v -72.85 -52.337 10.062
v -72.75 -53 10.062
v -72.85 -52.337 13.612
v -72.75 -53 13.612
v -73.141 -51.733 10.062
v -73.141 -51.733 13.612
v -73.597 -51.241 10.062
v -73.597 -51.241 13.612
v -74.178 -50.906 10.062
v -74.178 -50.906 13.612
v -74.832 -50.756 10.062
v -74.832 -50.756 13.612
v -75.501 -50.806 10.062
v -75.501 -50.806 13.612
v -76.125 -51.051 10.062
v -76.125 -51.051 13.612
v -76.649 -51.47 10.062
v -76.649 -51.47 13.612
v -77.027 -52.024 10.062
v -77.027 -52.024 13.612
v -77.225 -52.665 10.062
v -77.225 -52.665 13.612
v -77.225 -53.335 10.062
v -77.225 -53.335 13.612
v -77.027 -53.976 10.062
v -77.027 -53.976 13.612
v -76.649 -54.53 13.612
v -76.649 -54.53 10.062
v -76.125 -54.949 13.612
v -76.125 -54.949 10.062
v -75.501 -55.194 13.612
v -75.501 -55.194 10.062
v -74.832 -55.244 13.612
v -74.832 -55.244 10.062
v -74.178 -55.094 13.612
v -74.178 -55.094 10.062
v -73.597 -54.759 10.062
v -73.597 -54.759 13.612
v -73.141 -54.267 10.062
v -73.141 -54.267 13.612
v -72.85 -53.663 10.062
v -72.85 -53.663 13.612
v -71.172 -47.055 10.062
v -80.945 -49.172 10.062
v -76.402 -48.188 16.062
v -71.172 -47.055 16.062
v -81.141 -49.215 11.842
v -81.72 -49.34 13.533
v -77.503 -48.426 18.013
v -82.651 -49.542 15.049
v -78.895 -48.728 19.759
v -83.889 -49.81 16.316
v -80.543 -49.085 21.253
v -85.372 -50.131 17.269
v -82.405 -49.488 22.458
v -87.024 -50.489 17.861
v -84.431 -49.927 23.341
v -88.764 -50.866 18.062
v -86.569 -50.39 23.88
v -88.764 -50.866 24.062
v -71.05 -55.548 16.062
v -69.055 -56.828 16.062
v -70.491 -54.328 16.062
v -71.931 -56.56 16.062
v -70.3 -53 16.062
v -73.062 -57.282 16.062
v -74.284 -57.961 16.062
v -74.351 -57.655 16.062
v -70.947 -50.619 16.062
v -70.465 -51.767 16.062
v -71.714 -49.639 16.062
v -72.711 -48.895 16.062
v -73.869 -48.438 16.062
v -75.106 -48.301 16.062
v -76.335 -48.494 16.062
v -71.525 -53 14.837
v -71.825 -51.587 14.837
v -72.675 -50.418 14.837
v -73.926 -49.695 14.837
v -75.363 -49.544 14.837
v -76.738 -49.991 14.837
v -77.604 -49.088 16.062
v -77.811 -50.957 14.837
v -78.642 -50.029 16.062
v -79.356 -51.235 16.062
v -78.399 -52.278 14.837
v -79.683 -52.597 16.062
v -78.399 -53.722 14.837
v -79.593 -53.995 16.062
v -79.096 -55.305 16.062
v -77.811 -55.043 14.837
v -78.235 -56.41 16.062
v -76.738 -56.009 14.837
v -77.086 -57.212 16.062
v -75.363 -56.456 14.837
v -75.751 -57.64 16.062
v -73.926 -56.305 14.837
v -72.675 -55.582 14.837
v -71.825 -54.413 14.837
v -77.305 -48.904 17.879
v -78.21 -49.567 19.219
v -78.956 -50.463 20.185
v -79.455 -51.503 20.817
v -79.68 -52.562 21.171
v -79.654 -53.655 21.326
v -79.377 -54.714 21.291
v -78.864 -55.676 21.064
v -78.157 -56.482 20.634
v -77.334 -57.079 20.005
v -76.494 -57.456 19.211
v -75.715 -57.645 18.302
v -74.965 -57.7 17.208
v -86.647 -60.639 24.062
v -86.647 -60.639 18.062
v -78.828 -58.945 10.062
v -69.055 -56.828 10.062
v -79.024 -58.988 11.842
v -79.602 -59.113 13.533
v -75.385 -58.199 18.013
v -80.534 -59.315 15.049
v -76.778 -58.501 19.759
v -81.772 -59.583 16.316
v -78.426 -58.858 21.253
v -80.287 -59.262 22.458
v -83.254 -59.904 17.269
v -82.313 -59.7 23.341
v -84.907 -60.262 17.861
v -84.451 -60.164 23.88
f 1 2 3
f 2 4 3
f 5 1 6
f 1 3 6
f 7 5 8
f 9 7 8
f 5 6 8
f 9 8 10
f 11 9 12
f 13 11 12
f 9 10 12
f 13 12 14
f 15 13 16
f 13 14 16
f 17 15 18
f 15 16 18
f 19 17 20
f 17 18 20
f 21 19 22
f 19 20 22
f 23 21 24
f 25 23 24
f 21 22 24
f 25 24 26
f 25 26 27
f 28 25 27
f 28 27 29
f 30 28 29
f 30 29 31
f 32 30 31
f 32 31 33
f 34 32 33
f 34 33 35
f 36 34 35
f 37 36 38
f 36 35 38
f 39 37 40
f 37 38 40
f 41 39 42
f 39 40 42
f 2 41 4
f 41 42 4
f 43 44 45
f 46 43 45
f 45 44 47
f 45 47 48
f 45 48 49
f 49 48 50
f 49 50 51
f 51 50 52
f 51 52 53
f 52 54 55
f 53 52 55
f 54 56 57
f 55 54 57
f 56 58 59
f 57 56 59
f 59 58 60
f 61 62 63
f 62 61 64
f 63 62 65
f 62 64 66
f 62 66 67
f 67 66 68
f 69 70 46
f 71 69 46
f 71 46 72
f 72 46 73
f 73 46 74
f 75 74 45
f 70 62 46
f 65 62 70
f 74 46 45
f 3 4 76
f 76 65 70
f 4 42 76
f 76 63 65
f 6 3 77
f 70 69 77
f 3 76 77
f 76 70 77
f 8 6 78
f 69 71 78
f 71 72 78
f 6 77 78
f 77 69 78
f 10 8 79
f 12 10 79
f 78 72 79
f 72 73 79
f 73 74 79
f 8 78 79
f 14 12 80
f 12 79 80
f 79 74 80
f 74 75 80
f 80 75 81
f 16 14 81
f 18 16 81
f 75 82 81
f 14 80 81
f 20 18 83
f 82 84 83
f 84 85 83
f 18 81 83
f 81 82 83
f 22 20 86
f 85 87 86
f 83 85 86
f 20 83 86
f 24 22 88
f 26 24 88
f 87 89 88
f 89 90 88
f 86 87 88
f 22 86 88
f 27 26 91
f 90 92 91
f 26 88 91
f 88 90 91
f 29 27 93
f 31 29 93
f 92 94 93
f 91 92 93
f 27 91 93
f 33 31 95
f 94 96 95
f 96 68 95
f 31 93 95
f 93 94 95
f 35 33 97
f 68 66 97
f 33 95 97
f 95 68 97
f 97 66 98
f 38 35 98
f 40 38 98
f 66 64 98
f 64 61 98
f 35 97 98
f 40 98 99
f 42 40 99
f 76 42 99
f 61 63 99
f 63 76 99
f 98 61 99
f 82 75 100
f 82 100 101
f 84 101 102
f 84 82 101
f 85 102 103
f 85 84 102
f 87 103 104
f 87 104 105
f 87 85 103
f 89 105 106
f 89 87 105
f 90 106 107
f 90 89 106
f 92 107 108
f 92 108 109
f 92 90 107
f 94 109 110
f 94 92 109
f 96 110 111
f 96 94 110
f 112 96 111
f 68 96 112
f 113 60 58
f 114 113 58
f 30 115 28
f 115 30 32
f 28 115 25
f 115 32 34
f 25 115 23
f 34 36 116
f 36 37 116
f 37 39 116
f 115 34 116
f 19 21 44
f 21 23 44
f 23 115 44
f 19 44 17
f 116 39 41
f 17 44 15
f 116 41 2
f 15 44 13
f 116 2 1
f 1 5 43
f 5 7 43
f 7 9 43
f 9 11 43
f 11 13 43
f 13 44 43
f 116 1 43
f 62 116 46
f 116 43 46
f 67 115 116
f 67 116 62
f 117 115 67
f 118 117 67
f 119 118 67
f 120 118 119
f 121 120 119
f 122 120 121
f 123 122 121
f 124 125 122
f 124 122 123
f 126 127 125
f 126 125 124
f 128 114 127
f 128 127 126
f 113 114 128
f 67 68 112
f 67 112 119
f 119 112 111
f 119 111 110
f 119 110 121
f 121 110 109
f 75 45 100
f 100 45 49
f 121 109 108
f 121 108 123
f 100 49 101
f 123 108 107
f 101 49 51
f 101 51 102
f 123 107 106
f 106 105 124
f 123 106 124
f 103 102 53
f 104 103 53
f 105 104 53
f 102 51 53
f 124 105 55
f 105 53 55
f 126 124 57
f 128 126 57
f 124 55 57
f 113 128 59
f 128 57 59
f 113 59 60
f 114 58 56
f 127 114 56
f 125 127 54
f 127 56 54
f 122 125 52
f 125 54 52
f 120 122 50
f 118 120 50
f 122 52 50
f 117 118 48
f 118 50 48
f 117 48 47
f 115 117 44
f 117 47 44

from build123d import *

# Parameters (mm, degrees)
EXTRUDE_1_DEPTH     = 5
CUT_EXTRUDE_1_REACH = 109.797
SKETCH_2_R          = 4.7


# Read off the part's stored shape, not the designer's step: 高级异型孔1
with BuildPart() as part:
    # 草图1 → 凸台-拉伸1 (new, symmetric)
    with BuildSketch(Plane(origin=(-126.798228997, -64.222453956, -29.938468974), x_dir=(0, 0, -1), z_dir=(-0.21174441426742976, 0.9773250754107066, 0))):
        with BuildLine():
            Line((-40, -48), (-40, -58))
            Line((-40, -58), (-46, -58))
            Line((-46, -58), (-46, -52.649110641))
            ThreePointArc((-46, -52.649110641), (-51.832159566, -47.483314774), (-54, -40))
            Line((-54, -40), (-48, -40))
            ThreePointArc((-48, -40), (-45.656854249, -45.656854249), (-40, -48))
        make_face()
    extrude(amount=EXTRUDE_1_DEPTH, both=True)

    # 高级异型孔1 outline → 高级异型孔1 (revolve, cut)
    with BuildSketch(Plane(origin=(-75, -53, 0), x_dir=(1, 0, 0), z_dir=(0, -1, 0))):
        Polygon((0, 10.061531026), (2.25, 10.061531026), (2.25, 13.611531026), (4.7, 16.061531026), (0, 16.061531026), align=None)
    revolve(axis=Axis((-75, -53, 0), (0, 0, 1)), mode=Mode.SUBTRACT)

    # 草图2 → 切除-拉伸1 (cut, up to next)
    with BuildSketch(Plane.XY.offset(16.061531026), mode=Mode.PRIVATE) as cut_extrude_1_sk1:
        with Locations((-75, -53)):
            Circle(SKETCH_2_R)
    cut_extrude_1_tool1 = extrude(cut_extrude_1_sk1.sketch, amount=CUT_EXTRUDE_1_REACH, mode=Mode.PRIVATE) & part.part
    add(cut_extrude_1_tool1.solids().sort_by_distance((-75, -53, 16.061531))[0], mode=Mode.SUBTRACT)


solid = part.part
